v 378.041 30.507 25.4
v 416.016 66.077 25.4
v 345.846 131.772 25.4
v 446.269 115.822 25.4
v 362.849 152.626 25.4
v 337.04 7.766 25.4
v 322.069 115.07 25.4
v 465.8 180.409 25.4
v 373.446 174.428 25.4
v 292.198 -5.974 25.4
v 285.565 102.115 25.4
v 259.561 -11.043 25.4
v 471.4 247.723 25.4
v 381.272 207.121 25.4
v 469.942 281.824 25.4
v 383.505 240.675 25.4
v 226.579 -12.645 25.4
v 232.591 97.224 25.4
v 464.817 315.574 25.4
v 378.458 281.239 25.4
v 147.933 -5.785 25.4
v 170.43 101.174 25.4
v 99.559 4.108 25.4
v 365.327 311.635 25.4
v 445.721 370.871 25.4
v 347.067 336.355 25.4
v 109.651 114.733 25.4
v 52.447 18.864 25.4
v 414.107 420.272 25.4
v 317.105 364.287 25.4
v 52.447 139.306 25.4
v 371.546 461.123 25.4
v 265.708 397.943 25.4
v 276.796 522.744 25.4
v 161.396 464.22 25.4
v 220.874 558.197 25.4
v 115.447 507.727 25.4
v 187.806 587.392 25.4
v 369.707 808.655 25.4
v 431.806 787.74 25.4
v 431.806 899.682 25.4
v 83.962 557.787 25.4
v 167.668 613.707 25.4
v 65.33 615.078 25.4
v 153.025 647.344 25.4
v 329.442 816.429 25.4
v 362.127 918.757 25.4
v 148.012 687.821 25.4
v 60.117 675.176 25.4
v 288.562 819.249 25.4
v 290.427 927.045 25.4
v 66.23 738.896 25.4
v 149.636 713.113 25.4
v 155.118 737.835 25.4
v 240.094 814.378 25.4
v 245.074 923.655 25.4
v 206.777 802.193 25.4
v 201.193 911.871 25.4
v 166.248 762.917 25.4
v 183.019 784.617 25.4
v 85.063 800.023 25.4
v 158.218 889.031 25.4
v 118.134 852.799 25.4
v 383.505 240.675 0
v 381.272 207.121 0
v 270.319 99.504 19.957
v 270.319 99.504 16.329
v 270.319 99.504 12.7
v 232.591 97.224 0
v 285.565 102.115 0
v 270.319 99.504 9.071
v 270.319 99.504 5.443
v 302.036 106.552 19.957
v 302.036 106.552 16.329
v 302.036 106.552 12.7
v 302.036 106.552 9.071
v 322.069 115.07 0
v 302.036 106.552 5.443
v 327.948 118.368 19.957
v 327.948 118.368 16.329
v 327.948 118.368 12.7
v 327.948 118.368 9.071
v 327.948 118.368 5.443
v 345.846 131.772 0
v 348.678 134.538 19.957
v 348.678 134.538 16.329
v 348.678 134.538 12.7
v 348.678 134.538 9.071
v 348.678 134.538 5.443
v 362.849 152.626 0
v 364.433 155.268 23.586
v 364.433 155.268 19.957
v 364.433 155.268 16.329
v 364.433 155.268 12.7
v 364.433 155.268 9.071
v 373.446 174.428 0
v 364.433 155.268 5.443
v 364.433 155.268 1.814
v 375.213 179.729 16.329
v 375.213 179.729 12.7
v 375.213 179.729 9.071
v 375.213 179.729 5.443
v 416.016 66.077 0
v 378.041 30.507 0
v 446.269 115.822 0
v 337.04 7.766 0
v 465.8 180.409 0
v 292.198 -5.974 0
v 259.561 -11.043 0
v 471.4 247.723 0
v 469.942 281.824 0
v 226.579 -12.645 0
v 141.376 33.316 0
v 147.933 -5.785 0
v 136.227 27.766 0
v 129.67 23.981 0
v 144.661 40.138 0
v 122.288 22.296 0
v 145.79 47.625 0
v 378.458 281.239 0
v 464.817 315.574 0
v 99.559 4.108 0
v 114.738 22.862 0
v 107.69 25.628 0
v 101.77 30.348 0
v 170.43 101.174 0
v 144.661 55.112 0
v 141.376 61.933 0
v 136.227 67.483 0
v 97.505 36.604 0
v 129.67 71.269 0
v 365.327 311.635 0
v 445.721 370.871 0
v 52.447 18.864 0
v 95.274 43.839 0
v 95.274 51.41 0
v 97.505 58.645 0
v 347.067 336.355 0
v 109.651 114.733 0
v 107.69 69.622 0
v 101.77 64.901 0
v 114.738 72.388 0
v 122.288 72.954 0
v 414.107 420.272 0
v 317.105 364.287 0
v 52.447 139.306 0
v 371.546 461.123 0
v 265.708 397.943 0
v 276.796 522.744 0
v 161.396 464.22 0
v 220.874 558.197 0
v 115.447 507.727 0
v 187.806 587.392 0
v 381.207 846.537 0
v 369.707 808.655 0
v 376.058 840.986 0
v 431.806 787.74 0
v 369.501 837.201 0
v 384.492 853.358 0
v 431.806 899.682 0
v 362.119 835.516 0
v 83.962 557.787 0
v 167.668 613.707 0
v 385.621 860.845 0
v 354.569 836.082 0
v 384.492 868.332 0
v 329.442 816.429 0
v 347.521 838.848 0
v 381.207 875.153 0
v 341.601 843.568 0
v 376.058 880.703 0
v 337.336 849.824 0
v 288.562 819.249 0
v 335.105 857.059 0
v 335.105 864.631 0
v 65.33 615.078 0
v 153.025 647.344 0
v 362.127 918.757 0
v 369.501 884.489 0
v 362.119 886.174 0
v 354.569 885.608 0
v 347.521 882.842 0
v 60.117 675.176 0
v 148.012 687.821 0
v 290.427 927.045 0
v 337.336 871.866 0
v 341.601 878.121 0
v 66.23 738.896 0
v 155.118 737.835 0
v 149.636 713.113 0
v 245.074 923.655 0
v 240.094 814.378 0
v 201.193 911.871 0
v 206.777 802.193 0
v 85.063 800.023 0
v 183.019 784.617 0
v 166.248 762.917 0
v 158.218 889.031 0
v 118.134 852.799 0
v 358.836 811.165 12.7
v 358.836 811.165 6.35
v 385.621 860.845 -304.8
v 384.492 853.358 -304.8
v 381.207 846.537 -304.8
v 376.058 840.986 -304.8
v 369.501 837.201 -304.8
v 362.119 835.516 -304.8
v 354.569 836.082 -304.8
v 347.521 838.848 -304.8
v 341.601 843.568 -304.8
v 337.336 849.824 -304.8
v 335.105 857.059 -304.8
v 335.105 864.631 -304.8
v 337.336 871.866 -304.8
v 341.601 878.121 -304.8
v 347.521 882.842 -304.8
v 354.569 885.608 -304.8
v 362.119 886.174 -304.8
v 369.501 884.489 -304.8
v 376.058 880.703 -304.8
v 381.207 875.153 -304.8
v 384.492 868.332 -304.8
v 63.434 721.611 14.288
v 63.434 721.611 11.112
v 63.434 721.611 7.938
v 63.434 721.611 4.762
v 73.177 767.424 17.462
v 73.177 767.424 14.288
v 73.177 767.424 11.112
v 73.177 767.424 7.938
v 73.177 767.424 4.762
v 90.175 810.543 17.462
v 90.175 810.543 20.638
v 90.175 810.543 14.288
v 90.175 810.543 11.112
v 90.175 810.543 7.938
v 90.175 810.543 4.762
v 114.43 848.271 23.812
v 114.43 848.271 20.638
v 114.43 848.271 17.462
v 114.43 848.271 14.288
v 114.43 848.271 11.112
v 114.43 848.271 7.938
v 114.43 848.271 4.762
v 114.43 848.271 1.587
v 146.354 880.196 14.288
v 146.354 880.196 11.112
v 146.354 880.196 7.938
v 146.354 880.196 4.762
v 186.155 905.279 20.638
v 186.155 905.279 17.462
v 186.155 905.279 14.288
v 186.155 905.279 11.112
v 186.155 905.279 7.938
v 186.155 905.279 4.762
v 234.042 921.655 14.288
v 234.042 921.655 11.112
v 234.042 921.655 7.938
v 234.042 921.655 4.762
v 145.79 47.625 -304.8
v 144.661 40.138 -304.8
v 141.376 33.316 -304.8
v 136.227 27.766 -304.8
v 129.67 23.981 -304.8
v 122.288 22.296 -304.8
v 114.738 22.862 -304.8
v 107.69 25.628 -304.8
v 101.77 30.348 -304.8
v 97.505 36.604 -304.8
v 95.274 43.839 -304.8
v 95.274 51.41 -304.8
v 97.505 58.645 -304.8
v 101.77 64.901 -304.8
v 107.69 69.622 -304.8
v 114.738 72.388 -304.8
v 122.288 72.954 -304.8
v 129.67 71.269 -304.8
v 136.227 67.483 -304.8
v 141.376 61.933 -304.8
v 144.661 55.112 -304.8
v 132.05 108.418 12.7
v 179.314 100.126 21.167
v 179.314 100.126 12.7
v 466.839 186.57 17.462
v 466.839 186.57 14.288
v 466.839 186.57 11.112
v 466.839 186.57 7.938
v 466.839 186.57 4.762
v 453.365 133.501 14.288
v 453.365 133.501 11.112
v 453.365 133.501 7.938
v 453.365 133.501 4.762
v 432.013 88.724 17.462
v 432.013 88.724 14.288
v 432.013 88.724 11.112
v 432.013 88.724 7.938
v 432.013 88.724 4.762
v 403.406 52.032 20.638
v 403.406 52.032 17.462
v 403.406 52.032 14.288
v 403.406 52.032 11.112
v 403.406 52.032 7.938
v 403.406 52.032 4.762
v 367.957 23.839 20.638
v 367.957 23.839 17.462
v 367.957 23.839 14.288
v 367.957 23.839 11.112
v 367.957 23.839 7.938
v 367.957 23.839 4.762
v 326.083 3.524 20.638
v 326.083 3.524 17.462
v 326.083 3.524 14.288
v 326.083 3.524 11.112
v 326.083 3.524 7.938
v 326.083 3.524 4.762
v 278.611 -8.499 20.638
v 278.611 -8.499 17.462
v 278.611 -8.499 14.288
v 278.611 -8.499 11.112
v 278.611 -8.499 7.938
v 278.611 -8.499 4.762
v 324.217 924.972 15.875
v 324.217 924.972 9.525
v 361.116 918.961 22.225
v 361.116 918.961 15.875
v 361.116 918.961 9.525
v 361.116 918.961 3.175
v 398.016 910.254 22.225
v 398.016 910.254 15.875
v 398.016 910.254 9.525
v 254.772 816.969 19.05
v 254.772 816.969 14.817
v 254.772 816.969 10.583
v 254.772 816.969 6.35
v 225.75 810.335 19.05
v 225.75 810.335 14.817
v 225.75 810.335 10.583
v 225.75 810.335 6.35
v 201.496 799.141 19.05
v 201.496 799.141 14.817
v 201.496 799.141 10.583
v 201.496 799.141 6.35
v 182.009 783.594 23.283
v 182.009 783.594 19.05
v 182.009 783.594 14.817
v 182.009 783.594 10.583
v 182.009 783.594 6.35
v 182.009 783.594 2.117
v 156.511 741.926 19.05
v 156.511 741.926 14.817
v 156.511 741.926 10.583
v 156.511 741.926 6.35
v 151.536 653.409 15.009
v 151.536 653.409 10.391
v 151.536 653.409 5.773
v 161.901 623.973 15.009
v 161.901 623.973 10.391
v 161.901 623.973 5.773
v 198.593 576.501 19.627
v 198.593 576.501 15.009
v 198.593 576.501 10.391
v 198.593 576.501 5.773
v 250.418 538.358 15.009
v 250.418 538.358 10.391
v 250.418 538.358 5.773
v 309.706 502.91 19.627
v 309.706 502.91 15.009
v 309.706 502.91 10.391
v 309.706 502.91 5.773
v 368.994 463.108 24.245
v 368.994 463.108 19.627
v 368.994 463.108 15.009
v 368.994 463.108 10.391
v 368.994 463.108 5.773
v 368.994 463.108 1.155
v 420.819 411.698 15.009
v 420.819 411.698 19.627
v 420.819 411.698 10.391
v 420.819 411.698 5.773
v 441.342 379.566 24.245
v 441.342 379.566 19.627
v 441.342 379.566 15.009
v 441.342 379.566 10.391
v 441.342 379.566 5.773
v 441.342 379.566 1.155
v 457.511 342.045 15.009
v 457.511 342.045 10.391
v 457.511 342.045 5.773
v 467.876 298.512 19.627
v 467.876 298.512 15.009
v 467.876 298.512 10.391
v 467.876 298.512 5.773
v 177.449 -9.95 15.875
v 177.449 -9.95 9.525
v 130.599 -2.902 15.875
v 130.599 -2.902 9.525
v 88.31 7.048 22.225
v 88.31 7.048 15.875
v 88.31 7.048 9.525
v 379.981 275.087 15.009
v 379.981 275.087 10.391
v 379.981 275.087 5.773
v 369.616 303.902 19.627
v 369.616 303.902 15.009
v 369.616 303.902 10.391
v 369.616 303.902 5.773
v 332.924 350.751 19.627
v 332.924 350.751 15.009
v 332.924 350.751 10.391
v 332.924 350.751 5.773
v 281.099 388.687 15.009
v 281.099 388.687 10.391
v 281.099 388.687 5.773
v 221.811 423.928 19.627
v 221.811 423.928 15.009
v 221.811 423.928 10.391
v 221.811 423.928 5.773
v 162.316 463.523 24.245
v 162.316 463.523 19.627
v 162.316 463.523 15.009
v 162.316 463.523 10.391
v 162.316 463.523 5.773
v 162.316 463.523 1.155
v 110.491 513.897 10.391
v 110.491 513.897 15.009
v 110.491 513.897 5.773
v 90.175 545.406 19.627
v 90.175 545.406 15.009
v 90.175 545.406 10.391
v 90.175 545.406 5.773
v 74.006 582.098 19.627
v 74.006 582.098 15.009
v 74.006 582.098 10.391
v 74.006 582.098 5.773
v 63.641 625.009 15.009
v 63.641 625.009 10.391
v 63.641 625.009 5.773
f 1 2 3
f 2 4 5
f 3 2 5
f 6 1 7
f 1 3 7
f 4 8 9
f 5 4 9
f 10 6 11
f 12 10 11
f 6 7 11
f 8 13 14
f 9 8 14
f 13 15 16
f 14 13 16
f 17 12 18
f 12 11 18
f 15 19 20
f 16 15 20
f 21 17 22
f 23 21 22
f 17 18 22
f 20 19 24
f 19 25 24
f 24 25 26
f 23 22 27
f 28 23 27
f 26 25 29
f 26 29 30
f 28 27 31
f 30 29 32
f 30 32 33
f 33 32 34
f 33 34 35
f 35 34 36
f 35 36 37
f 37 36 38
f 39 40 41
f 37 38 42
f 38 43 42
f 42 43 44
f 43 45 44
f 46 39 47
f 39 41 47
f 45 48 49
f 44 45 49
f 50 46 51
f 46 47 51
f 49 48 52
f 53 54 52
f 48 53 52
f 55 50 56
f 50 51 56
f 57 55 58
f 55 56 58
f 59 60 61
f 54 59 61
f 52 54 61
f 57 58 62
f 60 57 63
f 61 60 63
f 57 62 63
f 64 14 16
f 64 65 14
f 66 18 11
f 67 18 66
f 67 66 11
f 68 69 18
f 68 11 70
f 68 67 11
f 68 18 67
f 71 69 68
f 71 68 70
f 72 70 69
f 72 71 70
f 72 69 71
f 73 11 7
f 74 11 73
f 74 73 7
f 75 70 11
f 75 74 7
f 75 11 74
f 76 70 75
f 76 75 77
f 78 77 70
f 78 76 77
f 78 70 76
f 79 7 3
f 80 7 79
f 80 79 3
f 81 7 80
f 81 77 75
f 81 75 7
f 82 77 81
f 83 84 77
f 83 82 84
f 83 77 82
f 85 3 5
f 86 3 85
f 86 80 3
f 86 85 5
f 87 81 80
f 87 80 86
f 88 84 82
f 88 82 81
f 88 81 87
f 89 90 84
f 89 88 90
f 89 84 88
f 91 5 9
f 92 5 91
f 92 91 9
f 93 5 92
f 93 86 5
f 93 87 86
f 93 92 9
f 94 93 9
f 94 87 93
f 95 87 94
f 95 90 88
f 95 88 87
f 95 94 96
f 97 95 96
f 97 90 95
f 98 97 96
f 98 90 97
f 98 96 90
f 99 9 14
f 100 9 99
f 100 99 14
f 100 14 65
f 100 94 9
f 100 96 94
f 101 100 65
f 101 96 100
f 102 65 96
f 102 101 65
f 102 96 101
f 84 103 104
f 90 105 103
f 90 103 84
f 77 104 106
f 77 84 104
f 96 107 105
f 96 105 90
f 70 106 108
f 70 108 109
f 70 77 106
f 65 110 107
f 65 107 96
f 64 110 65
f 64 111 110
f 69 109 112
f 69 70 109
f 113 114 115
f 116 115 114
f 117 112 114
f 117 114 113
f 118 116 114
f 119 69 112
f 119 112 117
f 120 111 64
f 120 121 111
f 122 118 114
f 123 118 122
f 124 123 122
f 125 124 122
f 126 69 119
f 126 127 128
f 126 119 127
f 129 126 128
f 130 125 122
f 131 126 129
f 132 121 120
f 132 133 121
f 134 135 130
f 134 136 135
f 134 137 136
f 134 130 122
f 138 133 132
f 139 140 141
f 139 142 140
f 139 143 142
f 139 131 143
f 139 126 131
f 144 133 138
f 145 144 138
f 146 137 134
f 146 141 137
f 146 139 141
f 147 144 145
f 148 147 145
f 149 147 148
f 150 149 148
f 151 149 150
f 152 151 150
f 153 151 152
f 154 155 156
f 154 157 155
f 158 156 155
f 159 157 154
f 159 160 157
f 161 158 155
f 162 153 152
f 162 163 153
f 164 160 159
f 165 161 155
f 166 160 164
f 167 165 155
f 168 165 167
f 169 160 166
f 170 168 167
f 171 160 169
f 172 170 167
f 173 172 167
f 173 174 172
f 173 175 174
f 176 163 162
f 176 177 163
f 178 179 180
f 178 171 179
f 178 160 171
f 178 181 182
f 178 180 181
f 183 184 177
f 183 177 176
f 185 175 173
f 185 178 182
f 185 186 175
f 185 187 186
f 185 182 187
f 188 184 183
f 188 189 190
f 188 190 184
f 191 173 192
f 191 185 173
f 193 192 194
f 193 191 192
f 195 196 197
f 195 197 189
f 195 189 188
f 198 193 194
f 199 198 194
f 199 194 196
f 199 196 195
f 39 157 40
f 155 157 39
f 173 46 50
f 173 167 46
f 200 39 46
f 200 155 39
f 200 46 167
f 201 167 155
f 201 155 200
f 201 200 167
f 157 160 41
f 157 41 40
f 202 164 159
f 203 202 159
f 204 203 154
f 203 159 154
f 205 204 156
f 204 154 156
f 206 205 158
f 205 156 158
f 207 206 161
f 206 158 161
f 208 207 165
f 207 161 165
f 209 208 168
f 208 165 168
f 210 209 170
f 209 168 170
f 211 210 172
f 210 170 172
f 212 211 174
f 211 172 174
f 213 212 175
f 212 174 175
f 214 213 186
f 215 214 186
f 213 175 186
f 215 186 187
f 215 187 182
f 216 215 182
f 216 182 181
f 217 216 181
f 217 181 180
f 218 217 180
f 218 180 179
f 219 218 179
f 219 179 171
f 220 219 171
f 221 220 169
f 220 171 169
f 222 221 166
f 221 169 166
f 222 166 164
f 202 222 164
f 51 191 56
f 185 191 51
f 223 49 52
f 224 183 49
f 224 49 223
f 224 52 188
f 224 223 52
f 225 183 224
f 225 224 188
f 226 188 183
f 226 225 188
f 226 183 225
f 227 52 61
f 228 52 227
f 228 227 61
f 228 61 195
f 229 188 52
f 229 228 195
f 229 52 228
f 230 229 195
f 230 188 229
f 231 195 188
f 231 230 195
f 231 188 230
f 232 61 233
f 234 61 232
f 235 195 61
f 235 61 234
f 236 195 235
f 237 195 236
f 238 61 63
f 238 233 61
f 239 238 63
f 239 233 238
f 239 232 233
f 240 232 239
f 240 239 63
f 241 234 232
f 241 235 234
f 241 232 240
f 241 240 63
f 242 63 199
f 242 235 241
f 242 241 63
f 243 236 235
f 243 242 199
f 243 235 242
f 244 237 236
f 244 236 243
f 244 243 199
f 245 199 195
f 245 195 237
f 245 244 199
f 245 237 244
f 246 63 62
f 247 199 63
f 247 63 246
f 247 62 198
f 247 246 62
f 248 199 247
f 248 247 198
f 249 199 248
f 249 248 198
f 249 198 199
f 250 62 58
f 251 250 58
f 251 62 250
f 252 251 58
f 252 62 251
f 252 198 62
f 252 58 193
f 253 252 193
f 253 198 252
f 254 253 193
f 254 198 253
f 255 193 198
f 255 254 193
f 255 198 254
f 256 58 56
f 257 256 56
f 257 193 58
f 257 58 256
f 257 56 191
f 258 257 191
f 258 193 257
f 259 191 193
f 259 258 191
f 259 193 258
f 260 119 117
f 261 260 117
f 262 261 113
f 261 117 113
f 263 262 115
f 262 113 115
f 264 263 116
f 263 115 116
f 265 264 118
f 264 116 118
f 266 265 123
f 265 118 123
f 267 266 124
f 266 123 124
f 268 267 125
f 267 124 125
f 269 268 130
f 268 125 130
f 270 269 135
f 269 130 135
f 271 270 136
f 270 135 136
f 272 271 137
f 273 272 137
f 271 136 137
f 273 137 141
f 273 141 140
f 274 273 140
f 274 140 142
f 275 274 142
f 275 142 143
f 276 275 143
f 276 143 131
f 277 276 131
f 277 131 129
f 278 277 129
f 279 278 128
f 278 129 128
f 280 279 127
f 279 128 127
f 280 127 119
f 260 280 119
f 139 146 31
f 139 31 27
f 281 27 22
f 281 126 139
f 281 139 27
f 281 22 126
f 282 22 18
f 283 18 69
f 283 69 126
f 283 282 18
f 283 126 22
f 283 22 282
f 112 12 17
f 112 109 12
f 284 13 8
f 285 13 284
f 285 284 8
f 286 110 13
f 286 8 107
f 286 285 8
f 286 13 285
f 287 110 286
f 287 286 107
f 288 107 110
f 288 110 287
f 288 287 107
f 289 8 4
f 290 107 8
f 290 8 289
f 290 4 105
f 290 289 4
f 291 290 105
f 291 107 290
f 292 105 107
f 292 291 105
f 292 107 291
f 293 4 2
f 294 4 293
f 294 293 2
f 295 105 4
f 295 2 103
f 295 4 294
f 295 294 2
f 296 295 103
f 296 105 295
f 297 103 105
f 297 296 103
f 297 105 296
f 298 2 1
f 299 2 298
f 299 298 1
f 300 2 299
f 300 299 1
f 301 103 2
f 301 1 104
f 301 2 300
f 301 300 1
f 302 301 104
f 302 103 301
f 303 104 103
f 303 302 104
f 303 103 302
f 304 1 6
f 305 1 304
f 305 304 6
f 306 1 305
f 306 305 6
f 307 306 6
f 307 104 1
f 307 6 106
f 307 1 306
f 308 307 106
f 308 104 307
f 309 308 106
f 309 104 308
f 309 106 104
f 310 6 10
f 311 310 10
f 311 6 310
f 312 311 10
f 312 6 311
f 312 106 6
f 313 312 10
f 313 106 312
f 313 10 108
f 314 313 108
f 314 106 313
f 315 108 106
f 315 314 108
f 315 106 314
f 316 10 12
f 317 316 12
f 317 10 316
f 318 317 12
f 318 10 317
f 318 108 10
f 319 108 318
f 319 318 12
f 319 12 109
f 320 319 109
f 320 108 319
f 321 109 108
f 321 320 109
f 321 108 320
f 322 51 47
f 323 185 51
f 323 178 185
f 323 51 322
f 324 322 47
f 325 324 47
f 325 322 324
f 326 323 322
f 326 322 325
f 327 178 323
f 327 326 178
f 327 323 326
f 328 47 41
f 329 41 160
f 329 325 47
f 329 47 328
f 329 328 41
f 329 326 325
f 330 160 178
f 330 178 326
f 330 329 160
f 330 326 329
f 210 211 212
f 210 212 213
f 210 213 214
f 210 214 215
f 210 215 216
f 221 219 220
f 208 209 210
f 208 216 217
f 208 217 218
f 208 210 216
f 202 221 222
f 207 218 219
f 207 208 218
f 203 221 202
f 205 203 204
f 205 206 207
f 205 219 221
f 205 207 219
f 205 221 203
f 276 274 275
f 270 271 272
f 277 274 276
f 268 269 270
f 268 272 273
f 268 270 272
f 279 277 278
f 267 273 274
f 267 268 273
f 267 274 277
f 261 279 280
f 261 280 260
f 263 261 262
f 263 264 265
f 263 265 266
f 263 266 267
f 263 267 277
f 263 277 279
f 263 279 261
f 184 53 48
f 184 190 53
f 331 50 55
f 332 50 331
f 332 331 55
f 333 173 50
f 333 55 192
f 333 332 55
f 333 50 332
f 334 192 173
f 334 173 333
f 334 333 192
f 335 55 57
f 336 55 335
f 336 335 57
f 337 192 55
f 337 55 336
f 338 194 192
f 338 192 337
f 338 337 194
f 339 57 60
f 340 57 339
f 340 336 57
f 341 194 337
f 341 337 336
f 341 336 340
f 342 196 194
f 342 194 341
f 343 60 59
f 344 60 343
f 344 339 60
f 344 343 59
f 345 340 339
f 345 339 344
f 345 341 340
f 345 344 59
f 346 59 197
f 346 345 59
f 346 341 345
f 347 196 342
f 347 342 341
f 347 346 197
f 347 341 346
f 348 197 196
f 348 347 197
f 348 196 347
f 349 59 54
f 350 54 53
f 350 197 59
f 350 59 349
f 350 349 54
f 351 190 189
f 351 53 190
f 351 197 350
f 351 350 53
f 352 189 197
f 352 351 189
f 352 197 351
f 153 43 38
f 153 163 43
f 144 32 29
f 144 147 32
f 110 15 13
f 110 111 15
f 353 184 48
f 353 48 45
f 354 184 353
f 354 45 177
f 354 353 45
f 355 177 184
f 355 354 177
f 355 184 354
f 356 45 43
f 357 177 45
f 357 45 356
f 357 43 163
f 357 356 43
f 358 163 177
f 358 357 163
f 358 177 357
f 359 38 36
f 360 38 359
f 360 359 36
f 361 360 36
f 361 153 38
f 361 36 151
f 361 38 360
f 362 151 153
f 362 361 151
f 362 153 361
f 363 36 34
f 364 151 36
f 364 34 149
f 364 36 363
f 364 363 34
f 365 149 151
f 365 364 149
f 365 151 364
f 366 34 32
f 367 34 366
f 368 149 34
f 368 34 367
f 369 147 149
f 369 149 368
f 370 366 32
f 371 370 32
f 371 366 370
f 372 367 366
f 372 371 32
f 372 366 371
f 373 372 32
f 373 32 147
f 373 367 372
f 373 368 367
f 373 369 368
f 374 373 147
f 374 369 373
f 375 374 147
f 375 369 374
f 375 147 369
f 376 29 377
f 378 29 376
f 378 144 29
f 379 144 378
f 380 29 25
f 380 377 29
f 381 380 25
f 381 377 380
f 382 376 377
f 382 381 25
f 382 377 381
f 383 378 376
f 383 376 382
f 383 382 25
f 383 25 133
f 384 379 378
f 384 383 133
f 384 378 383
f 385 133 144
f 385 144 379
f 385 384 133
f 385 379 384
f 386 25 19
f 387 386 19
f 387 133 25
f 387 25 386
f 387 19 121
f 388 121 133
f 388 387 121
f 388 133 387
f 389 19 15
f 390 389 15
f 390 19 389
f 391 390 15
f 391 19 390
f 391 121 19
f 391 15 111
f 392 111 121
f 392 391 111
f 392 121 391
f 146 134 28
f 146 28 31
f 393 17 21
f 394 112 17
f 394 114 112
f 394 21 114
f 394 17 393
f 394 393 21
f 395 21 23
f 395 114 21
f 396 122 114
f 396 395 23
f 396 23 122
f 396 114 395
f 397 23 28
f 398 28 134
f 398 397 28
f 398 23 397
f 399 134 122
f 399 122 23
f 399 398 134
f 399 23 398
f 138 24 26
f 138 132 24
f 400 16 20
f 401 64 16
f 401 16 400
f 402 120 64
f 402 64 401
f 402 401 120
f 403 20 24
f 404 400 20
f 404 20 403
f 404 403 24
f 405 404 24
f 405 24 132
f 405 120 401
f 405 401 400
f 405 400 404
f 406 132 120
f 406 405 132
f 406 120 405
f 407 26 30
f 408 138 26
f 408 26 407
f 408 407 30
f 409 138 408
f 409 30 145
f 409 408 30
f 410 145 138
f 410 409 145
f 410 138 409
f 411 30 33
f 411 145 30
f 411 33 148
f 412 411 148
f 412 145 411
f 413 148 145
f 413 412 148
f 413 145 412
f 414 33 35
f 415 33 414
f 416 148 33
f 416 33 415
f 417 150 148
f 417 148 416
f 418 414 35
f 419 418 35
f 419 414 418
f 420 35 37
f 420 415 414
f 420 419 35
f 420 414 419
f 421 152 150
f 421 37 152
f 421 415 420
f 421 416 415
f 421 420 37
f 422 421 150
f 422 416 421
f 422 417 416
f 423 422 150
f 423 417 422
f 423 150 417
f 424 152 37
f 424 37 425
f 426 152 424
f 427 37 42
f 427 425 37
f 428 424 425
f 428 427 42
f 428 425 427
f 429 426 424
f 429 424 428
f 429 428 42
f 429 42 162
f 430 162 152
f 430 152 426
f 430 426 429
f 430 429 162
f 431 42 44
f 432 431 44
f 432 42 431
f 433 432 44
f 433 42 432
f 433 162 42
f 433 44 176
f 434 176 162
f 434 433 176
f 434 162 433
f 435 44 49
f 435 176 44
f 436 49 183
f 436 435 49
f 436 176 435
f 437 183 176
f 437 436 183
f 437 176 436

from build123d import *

# Parameters (mm, degrees)
BOSS_EXTRUDE1_DEPTH = 25.4
SKETCH2_R           = 25.4
BOSS_EXTRUDE2_DEPTH = 304.8


with BuildPart() as part:
    # Sketch1 → Boss-Extrude1 (new body)
    with BuildSketch(Plane.XY):
        with BuildLine():
            add(Edge.make_bspline(
                [(471.400045341, 247.723418726), (471.253377656, 237.207919779), (470.967830054, 216.735274463), (467.254101988, 187.082974518), (461.8496739, 159.345276671), (453.870836324, 133.784385037), (444.180642621, 110.205863151), (432.473184544, 88.68343609), (419.069697548, 69.152650509), (403.779500623, 51.811813407), (386.883763515, 36.465486204), (368.07226234, 23.500783632), (347.87819623, 12.143124499), (326.005689501, 3.075456628), (302.798046482, -3.945259965), (278.356817124, -8.845510147), (252.854402734, -12.087794668), (235.433814702, -12.457415416), (226.578825663, -12.645295851)],
                knots=[0, 0, 0, 0, 1.243239104, 2.420464626, 3.5298884, 4.582278609, 5.582746481, 6.541150455, 7.475403342, 8.379003492, 9.270392267, 10.168465759, 11.076013954, 12.006683471, 12.963517291, 13.939882109, 14.95282976, 16, 16, 16, 16], degree=3))
            add(Edge.make_bspline(
                [(226.578825663, -12.645295851), (218.352164012, -12.538505316), (201.941331975, -12.325475825), (177.573248938, -10.221700143), (153.862654705, -6.662758999), (130.879483257, -3.263565991), (109.182795007, 1.737149247), (88.715264824, 6.718897763), (69.935399564, 12.530624018), (58.098073578, 16.817649327), (52.446882793, 18.864293811)],
                knots=[0, 0, 0, 0, 1.110164411, 2.214594747, 3.297432602, 4.346158016, 5.348621489, 6.300893974, 7.188839411, 8, 8, 8, 8], degree=3))
            Line((52.446882793, 18.864293811), (52.446882793, 139.305554296))
            add(Edge.make_bspline(
                [(52.446882793, 139.305554296), (64.874628492, 133.075868175), (90.412266994, 120.274554406), (125.374016113, 109.704702571), (155.301093725, 103.008826714), (179.811466542, 99.962362648), (205.657832859, 97.41723642), (223.461985851, 97.289275944), (232.590523691, 97.223668102)],
                knots=[0, 0, 0, 0, 1.33626015, 2.745866344, 3.501339399, 4.286907587, 5.121663978, 6, 6, 6, 6], degree=3))
            add(Edge.make_bspline(
                [(232.590523691, 97.223668102), (239.158269417, 97.352295207), (251.76305327, 97.599155684), (269.927956029, 99.212302505), (286.582747303, 102.077475814), (301.811701074, 106.180132756), (315.556993667, 111.584001003), (327.916187793, 118.068049642), (339.074197486, 125.536988417), (348.820608618, 134.331311428), (357.487925057, 144.147017107), (364.581237124, 155.14551392), (370.818795453, 166.942817171), (377.159465823, 184.562779609), (382.483224001, 209.282497228), (383.152996334, 229.862905592), (383.504874178, 240.675221038)],
                knots=[0, 0, 0, 0, 1.150469122, 2.207974428, 3.191023612, 4.107189959, 4.965818341, 5.772540898, 6.548058224, 7.311004937, 8.065940222, 8.834721628, 9.59805231, 10.398484715, 12.107874311, 14, 14, 14, 14], degree=3))
            add(Edge.make_bspline(
                [(383.504874178, 240.675221038), (383.375775152, 246.629845256), (383.125140139, 258.190252509), (380.338077986, 274.806688854), (376.07447805, 290.096343088), (367.854208023, 308.522003494), (354.046911722, 329.449339694), (333.034344764, 351.517108283), (308.623384124, 371.497142004), (280.873457154, 389.02389929), (251.61970563, 406.27894442), (221.506803957, 423.847060642), (191.575771198, 442.899613424), (161.963381352, 463.038143438), (134.213750684, 486.282103081), (113.808817585, 508.88596626), (99.373288206, 528.958664647), (89.850872373, 545.572294954), (81.174232028, 563.263750696), (73.576338245, 582.335707349), (67.531929478, 603.000329232), (63.295829594, 625.423786322), (60.478492711, 649.675796329), (60.240534913, 666.460677888), (60.116980277, 675.175878486)],
                knots=[0, 0, 0, 0, 0.683481112, 1.326921685, 1.929962516, 2.50227757, 3.638507422, 4.789972352, 5.991472863, 7.25317922, 8.556146245, 9.89452332, 11.257815158, 12.632065813, 14.006385259, 15.406082955, 16.117620294, 16.843365227, 17.603177928, 18.380093015, 19.199067628, 20.072523982, 20.999198172, 22, 22, 22, 22], degree=3))
            add(Edge.make_bspline(
                [(60.116980277, 675.175878486), (60.266347944, 682.992198254), (60.563202146, 698.526399296), (63.268407253, 721.702673865), (67.029218595, 744.756252708), (72.938939866, 767.448084012), (80.167383133, 789.646297398), (89.804124706, 810.536229263), (101.036631814, 830.225911242), (114.138002232, 848.513903833), (129.090687529, 865.465550925), (146.225980036, 880.584019249), (165.180405766, 894.200695058), (186.25374332, 905.817065987), (209.267887705, 915.423849913), (234.463660866, 922.322523346), (261.770601719, 926.159928277), (280.672245102, 926.743908945), (290.427204715, 927.045295851)],
                knots=[0, 0, 0, 0, 0.975284822, 1.938286936, 2.909635212, 3.888688786, 4.862446742, 5.819714805, 6.754769447, 7.688271271, 8.623047391, 9.570000944, 10.534585516, 11.530702109, 12.567083431, 13.640560543, 14.782315582, 16, 16, 16, 16], degree=3))
            add(Edge.make_bspline(
                [(290.427204715, 927.045295851), (295.821792555, 926.991722181), (307.119137631, 926.879528209), (324.527852683, 924.980301832), (342.762087373, 922.723310686), (361.204928023, 918.9146153), (379.753810568, 915.252650517), (397.872810434, 910.343585066), (415.259940193, 905.344049371), (426.429567097, 901.521556255), (431.805758331, 899.681704829)],
                knots=[0, 0, 0, 0, 0.894821679, 1.873935432, 2.90385038, 3.942982464, 4.997879381, 6.040990772, 7.057085046, 8, 8, 8, 8], degree=3))
            Line((431.805758331, 899.681704829), (431.805758331, 787.739741555))
            add(Edge.make_bspline(
                [(431.805758331, 787.739741555), (419.733337143, 792.567334637), (395.961042108, 802.073544308), (359.459798072, 811.490129789), (323.753844875, 817.963444445), (300.128004953, 818.8267049), (288.561505328, 819.249331217)],
                knots=[0, 0, 0, 0, 1.056204648, 2.079815483, 3.059935496, 4, 4, 4, 4], degree=3))
            add(Edge.make_bspline(
                [(288.561505328, 819.249331217), (282.752570383, 819.122689661), (271.45602877, 818.87641188), (255.109911254, 817.188203241), (239.881672867, 814.614015324), (225.951841889, 810.623314646), (213.116176925, 805.672302763), (201.514790252, 799.441268731), (191.040837515, 792.170464752), (178.867178614, 781.047066068), (166.220178449, 764.674130027), (155.599605332, 741.712519513), (148.992646474, 715.757338896), (148.348308943, 697.398939659), (148.01215144, 687.821174337)],
                knots=[0, 0, 0, 0, 0.952372428, 1.852063221, 2.692205999, 3.481287024, 4.2240212, 4.943845178, 5.635379706, 6.309142243, 7.641770197, 8.995046942, 10.432285145, 12, 12, 12, 12], degree=3))
            add(Edge.make_bspline(
                [(148.01215144, 687.821174337), (148.140595609, 681.866602086), (148.389959273, 670.306295722), (151.197000805, 653.623427204), (155.491262386, 638.151905383), (163.526964206, 619.363875789), (177.574982405, 598.255795043), (198.321298675, 575.633877137), (223.159092318, 555.954749965), (250.598364534, 537.810758968), (280.141752918, 520.983163901), (309.875051442, 502.801163048), (340.136869423, 484.327686063), (369.344089464, 463.38289759), (397.383997281, 440.065868192), (417.599449013, 416.756221958), (431.84436681, 396.186226446), (441.768261809, 379.422271106), (450.322403238, 361.273846123), (457.904994803, 341.861518304), (464.016933769, 320.870667906), (468.213349889, 298.093157172), (471.031668208, 273.498795578), (471.274503264, 256.507607726), (471.400045341, 247.723418726)],
                knots=[0, 0, 0, 0, 0.67806531, 1.316407357, 1.922242701, 2.504478499, 3.638316715, 4.792219623, 5.99029874, 7.239775474, 8.539190492, 9.864250055, 11.212536268, 12.578556635, 13.958200154, 15.359258983, 16.078046046, 16.808815146, 17.576792489, 18.362220191, 19.182266718, 20.064269398, 20.999256344, 22, 22, 22, 22], degree=3))
        make_face()
    extrude(amount=BOSS_EXTRUDE1_DEPTH)

    # Sketch2 → Boss-Extrude2 (add)
    with BuildSketch(Plane(origin=(0, 0, 0), x_dir=(-1, 0, 0), z_dir=(0, 0, -1))):
        with Locations(Location((-360.220944294, 860.84485697, 0), (0, 0, 180))):
            Circle(SKETCH2_R)
        with Locations(Location((-120.389931068, 47.62475465, 0), (0, 0, 180))):
            Circle(SKETCH2_R)
    extrude(amount=BOSS_EXTRUDE2_DEPTH)


solid = part.part
